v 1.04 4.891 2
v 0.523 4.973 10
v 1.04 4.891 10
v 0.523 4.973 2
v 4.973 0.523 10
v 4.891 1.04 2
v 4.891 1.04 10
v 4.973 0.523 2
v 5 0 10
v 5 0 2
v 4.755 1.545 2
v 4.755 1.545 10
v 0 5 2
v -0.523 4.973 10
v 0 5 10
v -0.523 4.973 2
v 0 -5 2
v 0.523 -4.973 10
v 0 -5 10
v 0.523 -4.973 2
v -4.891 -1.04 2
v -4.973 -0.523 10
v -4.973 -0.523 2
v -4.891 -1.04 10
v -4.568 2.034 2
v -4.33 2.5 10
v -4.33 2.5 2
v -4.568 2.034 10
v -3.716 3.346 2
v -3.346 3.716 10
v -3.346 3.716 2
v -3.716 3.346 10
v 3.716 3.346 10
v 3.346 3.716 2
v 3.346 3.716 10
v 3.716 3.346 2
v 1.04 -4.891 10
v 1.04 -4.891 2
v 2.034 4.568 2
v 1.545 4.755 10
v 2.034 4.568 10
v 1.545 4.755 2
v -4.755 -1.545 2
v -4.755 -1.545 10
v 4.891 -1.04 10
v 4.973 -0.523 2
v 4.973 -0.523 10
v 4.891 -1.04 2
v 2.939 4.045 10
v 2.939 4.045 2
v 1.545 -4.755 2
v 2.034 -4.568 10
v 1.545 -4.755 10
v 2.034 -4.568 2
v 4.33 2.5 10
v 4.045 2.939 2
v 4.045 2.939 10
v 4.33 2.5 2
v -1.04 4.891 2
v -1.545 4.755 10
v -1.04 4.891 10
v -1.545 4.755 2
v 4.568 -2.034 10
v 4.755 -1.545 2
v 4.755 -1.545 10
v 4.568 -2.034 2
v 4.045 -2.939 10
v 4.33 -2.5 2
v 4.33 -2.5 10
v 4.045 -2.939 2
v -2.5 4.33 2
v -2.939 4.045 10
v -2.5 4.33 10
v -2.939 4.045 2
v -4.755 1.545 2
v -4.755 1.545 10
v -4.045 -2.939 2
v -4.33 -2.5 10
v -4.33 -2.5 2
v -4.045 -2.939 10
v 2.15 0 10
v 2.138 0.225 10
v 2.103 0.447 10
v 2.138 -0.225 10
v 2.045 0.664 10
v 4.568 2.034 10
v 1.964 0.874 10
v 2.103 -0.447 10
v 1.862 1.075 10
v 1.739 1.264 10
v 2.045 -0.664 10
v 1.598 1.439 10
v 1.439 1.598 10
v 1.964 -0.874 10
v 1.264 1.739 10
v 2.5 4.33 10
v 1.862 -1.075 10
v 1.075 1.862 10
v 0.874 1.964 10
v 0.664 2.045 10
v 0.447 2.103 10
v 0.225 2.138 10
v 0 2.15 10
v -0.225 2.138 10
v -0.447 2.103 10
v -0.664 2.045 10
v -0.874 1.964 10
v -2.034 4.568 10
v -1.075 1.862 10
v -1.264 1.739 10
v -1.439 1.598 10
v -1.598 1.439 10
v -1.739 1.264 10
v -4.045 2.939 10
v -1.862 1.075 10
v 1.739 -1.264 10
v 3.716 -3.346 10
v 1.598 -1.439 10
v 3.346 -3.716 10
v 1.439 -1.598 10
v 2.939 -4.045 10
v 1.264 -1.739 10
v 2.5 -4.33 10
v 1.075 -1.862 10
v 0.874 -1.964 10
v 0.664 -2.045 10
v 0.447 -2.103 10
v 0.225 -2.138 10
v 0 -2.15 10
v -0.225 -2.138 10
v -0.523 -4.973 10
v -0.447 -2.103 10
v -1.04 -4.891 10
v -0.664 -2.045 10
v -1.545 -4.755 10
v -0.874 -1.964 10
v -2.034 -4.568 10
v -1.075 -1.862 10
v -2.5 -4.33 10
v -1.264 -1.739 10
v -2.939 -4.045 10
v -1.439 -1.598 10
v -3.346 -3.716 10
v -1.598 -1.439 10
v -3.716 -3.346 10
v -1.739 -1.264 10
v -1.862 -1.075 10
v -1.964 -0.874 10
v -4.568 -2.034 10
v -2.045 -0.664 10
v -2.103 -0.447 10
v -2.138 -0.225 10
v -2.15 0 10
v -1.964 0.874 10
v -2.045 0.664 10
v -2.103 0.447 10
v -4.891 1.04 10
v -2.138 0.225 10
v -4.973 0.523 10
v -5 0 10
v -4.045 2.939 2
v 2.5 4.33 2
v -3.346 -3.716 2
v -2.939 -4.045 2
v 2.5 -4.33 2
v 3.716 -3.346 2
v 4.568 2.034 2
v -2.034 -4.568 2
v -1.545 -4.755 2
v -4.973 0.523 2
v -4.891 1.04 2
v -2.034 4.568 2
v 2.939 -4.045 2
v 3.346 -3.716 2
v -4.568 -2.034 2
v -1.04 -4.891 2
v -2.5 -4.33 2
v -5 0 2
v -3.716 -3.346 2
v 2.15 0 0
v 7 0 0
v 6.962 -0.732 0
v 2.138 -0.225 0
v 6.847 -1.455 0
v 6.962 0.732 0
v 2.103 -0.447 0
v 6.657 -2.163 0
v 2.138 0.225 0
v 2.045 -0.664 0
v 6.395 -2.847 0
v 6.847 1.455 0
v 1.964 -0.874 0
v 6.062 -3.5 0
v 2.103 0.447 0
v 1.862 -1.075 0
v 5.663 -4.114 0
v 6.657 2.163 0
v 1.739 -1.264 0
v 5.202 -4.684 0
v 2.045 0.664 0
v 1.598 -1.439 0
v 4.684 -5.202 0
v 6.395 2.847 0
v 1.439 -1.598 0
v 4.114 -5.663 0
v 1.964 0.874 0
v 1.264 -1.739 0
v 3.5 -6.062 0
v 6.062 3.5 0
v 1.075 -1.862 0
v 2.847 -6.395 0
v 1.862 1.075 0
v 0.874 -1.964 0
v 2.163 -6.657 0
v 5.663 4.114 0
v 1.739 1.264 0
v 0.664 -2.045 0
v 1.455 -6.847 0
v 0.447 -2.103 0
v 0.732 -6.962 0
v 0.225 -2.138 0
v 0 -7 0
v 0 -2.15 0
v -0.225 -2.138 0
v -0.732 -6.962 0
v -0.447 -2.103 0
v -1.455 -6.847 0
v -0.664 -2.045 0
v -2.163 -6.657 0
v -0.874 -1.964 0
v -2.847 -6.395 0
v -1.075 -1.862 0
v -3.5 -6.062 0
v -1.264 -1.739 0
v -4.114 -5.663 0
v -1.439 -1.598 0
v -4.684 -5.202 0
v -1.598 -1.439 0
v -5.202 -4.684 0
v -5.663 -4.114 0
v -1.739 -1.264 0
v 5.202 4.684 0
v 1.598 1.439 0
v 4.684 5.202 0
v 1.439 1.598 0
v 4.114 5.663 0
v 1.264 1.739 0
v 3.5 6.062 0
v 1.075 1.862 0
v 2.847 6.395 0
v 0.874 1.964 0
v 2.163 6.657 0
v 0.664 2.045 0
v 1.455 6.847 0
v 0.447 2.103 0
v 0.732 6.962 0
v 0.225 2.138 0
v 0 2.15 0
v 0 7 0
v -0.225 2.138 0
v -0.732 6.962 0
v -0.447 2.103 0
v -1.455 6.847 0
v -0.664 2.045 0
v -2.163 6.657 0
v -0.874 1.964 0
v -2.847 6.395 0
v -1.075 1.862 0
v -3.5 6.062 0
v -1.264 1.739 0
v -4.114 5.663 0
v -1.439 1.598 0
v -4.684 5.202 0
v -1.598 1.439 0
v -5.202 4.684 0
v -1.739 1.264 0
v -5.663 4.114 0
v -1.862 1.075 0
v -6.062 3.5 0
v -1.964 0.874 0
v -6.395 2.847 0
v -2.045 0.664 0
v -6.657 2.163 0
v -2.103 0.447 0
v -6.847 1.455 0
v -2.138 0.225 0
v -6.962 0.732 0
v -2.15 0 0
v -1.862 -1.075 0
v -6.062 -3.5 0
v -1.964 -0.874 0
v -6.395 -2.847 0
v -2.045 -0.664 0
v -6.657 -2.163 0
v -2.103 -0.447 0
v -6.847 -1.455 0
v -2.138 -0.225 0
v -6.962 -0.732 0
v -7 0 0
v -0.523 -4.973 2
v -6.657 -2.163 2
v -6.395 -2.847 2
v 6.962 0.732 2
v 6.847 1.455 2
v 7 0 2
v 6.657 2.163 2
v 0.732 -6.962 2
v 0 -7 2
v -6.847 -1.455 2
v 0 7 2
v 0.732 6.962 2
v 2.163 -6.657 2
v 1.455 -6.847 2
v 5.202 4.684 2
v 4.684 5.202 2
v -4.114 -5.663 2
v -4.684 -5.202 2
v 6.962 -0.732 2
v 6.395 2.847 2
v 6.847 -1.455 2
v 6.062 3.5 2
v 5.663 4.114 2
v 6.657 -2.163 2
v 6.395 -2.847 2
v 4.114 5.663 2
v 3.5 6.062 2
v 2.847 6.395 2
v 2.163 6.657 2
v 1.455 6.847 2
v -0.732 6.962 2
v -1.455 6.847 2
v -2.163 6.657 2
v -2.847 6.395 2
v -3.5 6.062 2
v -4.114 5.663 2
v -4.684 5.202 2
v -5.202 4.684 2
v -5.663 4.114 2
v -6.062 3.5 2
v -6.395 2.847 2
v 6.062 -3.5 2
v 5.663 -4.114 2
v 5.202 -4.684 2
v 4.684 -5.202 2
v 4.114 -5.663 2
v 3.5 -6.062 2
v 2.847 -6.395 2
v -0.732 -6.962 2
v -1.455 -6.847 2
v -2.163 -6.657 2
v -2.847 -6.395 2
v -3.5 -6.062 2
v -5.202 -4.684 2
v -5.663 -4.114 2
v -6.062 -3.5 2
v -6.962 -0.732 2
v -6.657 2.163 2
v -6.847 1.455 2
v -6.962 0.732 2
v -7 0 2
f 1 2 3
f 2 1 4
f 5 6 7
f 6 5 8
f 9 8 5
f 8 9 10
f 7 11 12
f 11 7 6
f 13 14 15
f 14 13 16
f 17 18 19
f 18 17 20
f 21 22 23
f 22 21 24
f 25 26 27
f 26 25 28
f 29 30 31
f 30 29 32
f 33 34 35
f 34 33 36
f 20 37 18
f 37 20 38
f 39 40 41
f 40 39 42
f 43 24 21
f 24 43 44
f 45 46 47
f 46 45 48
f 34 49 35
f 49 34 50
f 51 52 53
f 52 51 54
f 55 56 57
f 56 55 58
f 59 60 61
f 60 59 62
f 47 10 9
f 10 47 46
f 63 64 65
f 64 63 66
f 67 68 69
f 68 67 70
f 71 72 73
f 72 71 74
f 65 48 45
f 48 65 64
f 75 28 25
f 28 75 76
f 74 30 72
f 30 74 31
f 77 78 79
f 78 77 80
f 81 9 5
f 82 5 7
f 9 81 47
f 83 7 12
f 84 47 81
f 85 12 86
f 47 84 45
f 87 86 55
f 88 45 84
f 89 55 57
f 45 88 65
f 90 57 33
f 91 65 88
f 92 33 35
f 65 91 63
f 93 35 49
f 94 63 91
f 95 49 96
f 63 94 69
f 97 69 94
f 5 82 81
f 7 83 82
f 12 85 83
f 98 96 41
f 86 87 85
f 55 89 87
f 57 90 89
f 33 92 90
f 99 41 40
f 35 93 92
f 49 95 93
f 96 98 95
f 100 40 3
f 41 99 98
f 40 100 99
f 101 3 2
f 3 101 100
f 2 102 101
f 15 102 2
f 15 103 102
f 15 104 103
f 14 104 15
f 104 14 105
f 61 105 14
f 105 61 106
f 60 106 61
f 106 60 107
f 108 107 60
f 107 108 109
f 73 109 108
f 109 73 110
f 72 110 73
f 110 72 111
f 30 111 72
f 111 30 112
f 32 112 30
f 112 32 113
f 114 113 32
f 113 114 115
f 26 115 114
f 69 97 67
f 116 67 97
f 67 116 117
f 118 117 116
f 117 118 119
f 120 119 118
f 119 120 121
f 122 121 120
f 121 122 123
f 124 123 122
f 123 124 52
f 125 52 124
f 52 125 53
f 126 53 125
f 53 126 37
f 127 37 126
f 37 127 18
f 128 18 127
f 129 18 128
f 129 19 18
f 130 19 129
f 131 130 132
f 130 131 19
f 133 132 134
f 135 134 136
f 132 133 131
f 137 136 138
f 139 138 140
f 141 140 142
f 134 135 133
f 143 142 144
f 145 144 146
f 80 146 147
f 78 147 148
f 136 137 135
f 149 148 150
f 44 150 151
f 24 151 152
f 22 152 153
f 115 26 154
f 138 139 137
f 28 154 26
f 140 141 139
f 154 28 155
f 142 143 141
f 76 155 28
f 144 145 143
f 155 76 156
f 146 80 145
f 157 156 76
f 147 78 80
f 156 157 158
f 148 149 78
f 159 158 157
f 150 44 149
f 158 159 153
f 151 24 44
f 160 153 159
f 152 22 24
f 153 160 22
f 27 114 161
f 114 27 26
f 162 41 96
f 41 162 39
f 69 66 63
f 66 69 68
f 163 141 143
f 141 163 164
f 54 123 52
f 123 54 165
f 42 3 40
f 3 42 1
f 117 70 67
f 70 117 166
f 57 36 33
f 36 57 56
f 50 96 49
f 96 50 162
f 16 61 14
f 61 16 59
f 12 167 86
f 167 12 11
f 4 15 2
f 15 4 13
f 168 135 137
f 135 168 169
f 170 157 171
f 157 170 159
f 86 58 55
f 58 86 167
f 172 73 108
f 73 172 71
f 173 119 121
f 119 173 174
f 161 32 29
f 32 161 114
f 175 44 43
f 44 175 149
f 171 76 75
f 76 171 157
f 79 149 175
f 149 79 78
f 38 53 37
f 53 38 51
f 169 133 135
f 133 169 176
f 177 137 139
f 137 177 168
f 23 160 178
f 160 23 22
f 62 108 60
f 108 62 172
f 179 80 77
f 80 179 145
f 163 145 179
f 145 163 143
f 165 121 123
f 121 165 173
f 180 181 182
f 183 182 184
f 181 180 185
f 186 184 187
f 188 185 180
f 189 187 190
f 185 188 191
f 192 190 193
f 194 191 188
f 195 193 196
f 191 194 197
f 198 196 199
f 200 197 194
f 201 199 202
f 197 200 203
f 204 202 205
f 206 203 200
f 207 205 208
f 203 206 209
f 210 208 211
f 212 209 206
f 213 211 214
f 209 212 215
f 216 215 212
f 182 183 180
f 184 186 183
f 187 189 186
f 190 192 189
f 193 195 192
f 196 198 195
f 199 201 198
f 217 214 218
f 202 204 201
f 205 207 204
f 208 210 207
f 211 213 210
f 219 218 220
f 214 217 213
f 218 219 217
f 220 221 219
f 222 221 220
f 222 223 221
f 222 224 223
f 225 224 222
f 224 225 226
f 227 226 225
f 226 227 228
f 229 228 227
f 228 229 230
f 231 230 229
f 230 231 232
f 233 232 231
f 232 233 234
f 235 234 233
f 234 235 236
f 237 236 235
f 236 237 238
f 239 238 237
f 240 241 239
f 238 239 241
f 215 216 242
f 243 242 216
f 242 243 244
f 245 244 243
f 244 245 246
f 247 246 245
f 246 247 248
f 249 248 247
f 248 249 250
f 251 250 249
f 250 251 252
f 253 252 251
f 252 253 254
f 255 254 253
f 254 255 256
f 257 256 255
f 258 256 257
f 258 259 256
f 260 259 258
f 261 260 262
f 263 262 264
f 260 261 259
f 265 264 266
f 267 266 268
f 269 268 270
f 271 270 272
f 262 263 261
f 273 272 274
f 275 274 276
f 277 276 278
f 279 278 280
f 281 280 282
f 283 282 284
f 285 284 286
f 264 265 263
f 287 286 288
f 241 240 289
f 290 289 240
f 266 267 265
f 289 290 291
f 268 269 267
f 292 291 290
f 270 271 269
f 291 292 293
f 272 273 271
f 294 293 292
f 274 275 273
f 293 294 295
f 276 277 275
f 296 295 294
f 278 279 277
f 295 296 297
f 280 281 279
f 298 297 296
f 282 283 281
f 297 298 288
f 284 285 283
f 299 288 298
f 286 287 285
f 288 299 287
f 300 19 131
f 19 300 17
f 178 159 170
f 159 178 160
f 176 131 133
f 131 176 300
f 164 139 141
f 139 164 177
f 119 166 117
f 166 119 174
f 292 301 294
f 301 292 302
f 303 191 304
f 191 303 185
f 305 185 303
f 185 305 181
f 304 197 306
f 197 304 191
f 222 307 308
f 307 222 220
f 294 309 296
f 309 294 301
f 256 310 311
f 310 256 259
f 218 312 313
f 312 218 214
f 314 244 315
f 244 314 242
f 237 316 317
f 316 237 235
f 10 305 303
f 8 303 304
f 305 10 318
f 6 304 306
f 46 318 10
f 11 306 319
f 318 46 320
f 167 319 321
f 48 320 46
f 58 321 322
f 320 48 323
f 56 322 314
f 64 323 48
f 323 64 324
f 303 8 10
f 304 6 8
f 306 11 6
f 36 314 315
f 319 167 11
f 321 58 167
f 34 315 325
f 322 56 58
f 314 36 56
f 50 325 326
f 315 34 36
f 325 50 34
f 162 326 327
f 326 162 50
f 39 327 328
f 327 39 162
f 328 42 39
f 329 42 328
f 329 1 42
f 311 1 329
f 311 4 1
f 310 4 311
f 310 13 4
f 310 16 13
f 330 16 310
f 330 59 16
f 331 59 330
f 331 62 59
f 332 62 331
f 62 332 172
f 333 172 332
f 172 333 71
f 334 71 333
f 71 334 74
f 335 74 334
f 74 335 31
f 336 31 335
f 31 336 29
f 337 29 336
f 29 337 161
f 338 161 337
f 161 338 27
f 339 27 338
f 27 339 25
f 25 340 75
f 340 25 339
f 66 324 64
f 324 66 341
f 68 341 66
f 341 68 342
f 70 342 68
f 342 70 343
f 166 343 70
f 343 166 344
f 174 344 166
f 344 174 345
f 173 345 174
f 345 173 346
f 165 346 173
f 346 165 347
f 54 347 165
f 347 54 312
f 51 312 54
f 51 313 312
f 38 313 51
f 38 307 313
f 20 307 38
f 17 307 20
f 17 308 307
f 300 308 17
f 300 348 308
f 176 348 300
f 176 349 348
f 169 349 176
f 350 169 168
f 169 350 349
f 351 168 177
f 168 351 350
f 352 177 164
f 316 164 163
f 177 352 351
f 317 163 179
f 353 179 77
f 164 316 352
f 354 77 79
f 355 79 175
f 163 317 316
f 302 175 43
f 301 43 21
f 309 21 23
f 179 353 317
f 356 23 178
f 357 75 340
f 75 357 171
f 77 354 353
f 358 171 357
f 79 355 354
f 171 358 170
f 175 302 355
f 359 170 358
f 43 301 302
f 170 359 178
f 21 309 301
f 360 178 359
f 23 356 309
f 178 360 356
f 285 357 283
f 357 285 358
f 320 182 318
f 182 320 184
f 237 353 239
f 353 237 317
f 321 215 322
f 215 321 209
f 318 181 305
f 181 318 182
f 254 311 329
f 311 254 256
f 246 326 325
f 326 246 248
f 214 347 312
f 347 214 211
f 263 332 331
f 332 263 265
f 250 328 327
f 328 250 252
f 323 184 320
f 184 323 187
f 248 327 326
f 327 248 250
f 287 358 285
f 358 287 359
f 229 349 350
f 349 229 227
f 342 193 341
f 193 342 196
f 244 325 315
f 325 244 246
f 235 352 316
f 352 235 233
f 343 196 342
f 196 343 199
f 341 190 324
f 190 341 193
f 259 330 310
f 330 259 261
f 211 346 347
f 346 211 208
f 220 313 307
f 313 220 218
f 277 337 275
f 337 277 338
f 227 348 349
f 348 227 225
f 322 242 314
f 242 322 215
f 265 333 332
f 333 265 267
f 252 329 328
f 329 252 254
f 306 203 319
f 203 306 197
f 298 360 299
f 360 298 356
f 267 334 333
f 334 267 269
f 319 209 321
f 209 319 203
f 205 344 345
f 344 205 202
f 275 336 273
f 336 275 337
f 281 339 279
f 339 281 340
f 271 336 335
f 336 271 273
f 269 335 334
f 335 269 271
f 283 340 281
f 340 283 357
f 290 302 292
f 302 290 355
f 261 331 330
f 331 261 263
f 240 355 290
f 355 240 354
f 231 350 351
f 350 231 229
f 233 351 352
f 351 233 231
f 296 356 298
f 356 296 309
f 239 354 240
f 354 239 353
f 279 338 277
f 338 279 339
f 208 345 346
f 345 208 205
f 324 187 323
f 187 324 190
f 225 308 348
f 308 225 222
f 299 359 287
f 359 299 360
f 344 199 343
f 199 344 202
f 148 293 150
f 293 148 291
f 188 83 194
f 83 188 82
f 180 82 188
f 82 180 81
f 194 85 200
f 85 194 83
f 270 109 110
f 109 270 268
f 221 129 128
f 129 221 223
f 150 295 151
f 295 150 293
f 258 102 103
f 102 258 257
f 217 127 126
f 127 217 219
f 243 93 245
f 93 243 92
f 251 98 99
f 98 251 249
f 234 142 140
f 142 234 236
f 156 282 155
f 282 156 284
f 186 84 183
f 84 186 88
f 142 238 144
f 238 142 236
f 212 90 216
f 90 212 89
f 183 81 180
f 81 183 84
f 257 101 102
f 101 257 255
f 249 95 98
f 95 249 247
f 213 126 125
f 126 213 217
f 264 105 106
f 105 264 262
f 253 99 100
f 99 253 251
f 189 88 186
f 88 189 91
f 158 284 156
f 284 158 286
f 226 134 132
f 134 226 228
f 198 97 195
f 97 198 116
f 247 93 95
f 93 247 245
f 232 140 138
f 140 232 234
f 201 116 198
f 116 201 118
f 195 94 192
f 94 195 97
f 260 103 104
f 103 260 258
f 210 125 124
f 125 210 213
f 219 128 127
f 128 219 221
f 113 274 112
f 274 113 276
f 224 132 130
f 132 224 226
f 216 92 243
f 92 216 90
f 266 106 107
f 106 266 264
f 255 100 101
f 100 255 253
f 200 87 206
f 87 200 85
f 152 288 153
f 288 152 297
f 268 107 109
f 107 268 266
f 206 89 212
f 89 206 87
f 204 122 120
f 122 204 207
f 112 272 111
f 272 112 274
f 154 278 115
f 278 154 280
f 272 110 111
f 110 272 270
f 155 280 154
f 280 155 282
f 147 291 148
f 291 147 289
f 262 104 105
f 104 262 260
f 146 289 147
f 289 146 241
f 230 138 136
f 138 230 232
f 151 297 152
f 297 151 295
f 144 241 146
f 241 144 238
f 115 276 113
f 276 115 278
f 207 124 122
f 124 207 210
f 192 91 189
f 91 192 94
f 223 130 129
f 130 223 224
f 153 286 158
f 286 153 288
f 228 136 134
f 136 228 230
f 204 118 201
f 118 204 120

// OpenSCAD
// Motor mounting standoff.
$fn = 60;
eps = 0.02;
thread_d = 4.3;
outer_d = 10;
length = 10;
difference() {
    union() { cylinder(d=outer_d,h=length); cylinder(d=outer_d+4,h=2); }
    translate([0,0,-eps]) cylinder(d=thread_d,h=length+2*eps);
}
